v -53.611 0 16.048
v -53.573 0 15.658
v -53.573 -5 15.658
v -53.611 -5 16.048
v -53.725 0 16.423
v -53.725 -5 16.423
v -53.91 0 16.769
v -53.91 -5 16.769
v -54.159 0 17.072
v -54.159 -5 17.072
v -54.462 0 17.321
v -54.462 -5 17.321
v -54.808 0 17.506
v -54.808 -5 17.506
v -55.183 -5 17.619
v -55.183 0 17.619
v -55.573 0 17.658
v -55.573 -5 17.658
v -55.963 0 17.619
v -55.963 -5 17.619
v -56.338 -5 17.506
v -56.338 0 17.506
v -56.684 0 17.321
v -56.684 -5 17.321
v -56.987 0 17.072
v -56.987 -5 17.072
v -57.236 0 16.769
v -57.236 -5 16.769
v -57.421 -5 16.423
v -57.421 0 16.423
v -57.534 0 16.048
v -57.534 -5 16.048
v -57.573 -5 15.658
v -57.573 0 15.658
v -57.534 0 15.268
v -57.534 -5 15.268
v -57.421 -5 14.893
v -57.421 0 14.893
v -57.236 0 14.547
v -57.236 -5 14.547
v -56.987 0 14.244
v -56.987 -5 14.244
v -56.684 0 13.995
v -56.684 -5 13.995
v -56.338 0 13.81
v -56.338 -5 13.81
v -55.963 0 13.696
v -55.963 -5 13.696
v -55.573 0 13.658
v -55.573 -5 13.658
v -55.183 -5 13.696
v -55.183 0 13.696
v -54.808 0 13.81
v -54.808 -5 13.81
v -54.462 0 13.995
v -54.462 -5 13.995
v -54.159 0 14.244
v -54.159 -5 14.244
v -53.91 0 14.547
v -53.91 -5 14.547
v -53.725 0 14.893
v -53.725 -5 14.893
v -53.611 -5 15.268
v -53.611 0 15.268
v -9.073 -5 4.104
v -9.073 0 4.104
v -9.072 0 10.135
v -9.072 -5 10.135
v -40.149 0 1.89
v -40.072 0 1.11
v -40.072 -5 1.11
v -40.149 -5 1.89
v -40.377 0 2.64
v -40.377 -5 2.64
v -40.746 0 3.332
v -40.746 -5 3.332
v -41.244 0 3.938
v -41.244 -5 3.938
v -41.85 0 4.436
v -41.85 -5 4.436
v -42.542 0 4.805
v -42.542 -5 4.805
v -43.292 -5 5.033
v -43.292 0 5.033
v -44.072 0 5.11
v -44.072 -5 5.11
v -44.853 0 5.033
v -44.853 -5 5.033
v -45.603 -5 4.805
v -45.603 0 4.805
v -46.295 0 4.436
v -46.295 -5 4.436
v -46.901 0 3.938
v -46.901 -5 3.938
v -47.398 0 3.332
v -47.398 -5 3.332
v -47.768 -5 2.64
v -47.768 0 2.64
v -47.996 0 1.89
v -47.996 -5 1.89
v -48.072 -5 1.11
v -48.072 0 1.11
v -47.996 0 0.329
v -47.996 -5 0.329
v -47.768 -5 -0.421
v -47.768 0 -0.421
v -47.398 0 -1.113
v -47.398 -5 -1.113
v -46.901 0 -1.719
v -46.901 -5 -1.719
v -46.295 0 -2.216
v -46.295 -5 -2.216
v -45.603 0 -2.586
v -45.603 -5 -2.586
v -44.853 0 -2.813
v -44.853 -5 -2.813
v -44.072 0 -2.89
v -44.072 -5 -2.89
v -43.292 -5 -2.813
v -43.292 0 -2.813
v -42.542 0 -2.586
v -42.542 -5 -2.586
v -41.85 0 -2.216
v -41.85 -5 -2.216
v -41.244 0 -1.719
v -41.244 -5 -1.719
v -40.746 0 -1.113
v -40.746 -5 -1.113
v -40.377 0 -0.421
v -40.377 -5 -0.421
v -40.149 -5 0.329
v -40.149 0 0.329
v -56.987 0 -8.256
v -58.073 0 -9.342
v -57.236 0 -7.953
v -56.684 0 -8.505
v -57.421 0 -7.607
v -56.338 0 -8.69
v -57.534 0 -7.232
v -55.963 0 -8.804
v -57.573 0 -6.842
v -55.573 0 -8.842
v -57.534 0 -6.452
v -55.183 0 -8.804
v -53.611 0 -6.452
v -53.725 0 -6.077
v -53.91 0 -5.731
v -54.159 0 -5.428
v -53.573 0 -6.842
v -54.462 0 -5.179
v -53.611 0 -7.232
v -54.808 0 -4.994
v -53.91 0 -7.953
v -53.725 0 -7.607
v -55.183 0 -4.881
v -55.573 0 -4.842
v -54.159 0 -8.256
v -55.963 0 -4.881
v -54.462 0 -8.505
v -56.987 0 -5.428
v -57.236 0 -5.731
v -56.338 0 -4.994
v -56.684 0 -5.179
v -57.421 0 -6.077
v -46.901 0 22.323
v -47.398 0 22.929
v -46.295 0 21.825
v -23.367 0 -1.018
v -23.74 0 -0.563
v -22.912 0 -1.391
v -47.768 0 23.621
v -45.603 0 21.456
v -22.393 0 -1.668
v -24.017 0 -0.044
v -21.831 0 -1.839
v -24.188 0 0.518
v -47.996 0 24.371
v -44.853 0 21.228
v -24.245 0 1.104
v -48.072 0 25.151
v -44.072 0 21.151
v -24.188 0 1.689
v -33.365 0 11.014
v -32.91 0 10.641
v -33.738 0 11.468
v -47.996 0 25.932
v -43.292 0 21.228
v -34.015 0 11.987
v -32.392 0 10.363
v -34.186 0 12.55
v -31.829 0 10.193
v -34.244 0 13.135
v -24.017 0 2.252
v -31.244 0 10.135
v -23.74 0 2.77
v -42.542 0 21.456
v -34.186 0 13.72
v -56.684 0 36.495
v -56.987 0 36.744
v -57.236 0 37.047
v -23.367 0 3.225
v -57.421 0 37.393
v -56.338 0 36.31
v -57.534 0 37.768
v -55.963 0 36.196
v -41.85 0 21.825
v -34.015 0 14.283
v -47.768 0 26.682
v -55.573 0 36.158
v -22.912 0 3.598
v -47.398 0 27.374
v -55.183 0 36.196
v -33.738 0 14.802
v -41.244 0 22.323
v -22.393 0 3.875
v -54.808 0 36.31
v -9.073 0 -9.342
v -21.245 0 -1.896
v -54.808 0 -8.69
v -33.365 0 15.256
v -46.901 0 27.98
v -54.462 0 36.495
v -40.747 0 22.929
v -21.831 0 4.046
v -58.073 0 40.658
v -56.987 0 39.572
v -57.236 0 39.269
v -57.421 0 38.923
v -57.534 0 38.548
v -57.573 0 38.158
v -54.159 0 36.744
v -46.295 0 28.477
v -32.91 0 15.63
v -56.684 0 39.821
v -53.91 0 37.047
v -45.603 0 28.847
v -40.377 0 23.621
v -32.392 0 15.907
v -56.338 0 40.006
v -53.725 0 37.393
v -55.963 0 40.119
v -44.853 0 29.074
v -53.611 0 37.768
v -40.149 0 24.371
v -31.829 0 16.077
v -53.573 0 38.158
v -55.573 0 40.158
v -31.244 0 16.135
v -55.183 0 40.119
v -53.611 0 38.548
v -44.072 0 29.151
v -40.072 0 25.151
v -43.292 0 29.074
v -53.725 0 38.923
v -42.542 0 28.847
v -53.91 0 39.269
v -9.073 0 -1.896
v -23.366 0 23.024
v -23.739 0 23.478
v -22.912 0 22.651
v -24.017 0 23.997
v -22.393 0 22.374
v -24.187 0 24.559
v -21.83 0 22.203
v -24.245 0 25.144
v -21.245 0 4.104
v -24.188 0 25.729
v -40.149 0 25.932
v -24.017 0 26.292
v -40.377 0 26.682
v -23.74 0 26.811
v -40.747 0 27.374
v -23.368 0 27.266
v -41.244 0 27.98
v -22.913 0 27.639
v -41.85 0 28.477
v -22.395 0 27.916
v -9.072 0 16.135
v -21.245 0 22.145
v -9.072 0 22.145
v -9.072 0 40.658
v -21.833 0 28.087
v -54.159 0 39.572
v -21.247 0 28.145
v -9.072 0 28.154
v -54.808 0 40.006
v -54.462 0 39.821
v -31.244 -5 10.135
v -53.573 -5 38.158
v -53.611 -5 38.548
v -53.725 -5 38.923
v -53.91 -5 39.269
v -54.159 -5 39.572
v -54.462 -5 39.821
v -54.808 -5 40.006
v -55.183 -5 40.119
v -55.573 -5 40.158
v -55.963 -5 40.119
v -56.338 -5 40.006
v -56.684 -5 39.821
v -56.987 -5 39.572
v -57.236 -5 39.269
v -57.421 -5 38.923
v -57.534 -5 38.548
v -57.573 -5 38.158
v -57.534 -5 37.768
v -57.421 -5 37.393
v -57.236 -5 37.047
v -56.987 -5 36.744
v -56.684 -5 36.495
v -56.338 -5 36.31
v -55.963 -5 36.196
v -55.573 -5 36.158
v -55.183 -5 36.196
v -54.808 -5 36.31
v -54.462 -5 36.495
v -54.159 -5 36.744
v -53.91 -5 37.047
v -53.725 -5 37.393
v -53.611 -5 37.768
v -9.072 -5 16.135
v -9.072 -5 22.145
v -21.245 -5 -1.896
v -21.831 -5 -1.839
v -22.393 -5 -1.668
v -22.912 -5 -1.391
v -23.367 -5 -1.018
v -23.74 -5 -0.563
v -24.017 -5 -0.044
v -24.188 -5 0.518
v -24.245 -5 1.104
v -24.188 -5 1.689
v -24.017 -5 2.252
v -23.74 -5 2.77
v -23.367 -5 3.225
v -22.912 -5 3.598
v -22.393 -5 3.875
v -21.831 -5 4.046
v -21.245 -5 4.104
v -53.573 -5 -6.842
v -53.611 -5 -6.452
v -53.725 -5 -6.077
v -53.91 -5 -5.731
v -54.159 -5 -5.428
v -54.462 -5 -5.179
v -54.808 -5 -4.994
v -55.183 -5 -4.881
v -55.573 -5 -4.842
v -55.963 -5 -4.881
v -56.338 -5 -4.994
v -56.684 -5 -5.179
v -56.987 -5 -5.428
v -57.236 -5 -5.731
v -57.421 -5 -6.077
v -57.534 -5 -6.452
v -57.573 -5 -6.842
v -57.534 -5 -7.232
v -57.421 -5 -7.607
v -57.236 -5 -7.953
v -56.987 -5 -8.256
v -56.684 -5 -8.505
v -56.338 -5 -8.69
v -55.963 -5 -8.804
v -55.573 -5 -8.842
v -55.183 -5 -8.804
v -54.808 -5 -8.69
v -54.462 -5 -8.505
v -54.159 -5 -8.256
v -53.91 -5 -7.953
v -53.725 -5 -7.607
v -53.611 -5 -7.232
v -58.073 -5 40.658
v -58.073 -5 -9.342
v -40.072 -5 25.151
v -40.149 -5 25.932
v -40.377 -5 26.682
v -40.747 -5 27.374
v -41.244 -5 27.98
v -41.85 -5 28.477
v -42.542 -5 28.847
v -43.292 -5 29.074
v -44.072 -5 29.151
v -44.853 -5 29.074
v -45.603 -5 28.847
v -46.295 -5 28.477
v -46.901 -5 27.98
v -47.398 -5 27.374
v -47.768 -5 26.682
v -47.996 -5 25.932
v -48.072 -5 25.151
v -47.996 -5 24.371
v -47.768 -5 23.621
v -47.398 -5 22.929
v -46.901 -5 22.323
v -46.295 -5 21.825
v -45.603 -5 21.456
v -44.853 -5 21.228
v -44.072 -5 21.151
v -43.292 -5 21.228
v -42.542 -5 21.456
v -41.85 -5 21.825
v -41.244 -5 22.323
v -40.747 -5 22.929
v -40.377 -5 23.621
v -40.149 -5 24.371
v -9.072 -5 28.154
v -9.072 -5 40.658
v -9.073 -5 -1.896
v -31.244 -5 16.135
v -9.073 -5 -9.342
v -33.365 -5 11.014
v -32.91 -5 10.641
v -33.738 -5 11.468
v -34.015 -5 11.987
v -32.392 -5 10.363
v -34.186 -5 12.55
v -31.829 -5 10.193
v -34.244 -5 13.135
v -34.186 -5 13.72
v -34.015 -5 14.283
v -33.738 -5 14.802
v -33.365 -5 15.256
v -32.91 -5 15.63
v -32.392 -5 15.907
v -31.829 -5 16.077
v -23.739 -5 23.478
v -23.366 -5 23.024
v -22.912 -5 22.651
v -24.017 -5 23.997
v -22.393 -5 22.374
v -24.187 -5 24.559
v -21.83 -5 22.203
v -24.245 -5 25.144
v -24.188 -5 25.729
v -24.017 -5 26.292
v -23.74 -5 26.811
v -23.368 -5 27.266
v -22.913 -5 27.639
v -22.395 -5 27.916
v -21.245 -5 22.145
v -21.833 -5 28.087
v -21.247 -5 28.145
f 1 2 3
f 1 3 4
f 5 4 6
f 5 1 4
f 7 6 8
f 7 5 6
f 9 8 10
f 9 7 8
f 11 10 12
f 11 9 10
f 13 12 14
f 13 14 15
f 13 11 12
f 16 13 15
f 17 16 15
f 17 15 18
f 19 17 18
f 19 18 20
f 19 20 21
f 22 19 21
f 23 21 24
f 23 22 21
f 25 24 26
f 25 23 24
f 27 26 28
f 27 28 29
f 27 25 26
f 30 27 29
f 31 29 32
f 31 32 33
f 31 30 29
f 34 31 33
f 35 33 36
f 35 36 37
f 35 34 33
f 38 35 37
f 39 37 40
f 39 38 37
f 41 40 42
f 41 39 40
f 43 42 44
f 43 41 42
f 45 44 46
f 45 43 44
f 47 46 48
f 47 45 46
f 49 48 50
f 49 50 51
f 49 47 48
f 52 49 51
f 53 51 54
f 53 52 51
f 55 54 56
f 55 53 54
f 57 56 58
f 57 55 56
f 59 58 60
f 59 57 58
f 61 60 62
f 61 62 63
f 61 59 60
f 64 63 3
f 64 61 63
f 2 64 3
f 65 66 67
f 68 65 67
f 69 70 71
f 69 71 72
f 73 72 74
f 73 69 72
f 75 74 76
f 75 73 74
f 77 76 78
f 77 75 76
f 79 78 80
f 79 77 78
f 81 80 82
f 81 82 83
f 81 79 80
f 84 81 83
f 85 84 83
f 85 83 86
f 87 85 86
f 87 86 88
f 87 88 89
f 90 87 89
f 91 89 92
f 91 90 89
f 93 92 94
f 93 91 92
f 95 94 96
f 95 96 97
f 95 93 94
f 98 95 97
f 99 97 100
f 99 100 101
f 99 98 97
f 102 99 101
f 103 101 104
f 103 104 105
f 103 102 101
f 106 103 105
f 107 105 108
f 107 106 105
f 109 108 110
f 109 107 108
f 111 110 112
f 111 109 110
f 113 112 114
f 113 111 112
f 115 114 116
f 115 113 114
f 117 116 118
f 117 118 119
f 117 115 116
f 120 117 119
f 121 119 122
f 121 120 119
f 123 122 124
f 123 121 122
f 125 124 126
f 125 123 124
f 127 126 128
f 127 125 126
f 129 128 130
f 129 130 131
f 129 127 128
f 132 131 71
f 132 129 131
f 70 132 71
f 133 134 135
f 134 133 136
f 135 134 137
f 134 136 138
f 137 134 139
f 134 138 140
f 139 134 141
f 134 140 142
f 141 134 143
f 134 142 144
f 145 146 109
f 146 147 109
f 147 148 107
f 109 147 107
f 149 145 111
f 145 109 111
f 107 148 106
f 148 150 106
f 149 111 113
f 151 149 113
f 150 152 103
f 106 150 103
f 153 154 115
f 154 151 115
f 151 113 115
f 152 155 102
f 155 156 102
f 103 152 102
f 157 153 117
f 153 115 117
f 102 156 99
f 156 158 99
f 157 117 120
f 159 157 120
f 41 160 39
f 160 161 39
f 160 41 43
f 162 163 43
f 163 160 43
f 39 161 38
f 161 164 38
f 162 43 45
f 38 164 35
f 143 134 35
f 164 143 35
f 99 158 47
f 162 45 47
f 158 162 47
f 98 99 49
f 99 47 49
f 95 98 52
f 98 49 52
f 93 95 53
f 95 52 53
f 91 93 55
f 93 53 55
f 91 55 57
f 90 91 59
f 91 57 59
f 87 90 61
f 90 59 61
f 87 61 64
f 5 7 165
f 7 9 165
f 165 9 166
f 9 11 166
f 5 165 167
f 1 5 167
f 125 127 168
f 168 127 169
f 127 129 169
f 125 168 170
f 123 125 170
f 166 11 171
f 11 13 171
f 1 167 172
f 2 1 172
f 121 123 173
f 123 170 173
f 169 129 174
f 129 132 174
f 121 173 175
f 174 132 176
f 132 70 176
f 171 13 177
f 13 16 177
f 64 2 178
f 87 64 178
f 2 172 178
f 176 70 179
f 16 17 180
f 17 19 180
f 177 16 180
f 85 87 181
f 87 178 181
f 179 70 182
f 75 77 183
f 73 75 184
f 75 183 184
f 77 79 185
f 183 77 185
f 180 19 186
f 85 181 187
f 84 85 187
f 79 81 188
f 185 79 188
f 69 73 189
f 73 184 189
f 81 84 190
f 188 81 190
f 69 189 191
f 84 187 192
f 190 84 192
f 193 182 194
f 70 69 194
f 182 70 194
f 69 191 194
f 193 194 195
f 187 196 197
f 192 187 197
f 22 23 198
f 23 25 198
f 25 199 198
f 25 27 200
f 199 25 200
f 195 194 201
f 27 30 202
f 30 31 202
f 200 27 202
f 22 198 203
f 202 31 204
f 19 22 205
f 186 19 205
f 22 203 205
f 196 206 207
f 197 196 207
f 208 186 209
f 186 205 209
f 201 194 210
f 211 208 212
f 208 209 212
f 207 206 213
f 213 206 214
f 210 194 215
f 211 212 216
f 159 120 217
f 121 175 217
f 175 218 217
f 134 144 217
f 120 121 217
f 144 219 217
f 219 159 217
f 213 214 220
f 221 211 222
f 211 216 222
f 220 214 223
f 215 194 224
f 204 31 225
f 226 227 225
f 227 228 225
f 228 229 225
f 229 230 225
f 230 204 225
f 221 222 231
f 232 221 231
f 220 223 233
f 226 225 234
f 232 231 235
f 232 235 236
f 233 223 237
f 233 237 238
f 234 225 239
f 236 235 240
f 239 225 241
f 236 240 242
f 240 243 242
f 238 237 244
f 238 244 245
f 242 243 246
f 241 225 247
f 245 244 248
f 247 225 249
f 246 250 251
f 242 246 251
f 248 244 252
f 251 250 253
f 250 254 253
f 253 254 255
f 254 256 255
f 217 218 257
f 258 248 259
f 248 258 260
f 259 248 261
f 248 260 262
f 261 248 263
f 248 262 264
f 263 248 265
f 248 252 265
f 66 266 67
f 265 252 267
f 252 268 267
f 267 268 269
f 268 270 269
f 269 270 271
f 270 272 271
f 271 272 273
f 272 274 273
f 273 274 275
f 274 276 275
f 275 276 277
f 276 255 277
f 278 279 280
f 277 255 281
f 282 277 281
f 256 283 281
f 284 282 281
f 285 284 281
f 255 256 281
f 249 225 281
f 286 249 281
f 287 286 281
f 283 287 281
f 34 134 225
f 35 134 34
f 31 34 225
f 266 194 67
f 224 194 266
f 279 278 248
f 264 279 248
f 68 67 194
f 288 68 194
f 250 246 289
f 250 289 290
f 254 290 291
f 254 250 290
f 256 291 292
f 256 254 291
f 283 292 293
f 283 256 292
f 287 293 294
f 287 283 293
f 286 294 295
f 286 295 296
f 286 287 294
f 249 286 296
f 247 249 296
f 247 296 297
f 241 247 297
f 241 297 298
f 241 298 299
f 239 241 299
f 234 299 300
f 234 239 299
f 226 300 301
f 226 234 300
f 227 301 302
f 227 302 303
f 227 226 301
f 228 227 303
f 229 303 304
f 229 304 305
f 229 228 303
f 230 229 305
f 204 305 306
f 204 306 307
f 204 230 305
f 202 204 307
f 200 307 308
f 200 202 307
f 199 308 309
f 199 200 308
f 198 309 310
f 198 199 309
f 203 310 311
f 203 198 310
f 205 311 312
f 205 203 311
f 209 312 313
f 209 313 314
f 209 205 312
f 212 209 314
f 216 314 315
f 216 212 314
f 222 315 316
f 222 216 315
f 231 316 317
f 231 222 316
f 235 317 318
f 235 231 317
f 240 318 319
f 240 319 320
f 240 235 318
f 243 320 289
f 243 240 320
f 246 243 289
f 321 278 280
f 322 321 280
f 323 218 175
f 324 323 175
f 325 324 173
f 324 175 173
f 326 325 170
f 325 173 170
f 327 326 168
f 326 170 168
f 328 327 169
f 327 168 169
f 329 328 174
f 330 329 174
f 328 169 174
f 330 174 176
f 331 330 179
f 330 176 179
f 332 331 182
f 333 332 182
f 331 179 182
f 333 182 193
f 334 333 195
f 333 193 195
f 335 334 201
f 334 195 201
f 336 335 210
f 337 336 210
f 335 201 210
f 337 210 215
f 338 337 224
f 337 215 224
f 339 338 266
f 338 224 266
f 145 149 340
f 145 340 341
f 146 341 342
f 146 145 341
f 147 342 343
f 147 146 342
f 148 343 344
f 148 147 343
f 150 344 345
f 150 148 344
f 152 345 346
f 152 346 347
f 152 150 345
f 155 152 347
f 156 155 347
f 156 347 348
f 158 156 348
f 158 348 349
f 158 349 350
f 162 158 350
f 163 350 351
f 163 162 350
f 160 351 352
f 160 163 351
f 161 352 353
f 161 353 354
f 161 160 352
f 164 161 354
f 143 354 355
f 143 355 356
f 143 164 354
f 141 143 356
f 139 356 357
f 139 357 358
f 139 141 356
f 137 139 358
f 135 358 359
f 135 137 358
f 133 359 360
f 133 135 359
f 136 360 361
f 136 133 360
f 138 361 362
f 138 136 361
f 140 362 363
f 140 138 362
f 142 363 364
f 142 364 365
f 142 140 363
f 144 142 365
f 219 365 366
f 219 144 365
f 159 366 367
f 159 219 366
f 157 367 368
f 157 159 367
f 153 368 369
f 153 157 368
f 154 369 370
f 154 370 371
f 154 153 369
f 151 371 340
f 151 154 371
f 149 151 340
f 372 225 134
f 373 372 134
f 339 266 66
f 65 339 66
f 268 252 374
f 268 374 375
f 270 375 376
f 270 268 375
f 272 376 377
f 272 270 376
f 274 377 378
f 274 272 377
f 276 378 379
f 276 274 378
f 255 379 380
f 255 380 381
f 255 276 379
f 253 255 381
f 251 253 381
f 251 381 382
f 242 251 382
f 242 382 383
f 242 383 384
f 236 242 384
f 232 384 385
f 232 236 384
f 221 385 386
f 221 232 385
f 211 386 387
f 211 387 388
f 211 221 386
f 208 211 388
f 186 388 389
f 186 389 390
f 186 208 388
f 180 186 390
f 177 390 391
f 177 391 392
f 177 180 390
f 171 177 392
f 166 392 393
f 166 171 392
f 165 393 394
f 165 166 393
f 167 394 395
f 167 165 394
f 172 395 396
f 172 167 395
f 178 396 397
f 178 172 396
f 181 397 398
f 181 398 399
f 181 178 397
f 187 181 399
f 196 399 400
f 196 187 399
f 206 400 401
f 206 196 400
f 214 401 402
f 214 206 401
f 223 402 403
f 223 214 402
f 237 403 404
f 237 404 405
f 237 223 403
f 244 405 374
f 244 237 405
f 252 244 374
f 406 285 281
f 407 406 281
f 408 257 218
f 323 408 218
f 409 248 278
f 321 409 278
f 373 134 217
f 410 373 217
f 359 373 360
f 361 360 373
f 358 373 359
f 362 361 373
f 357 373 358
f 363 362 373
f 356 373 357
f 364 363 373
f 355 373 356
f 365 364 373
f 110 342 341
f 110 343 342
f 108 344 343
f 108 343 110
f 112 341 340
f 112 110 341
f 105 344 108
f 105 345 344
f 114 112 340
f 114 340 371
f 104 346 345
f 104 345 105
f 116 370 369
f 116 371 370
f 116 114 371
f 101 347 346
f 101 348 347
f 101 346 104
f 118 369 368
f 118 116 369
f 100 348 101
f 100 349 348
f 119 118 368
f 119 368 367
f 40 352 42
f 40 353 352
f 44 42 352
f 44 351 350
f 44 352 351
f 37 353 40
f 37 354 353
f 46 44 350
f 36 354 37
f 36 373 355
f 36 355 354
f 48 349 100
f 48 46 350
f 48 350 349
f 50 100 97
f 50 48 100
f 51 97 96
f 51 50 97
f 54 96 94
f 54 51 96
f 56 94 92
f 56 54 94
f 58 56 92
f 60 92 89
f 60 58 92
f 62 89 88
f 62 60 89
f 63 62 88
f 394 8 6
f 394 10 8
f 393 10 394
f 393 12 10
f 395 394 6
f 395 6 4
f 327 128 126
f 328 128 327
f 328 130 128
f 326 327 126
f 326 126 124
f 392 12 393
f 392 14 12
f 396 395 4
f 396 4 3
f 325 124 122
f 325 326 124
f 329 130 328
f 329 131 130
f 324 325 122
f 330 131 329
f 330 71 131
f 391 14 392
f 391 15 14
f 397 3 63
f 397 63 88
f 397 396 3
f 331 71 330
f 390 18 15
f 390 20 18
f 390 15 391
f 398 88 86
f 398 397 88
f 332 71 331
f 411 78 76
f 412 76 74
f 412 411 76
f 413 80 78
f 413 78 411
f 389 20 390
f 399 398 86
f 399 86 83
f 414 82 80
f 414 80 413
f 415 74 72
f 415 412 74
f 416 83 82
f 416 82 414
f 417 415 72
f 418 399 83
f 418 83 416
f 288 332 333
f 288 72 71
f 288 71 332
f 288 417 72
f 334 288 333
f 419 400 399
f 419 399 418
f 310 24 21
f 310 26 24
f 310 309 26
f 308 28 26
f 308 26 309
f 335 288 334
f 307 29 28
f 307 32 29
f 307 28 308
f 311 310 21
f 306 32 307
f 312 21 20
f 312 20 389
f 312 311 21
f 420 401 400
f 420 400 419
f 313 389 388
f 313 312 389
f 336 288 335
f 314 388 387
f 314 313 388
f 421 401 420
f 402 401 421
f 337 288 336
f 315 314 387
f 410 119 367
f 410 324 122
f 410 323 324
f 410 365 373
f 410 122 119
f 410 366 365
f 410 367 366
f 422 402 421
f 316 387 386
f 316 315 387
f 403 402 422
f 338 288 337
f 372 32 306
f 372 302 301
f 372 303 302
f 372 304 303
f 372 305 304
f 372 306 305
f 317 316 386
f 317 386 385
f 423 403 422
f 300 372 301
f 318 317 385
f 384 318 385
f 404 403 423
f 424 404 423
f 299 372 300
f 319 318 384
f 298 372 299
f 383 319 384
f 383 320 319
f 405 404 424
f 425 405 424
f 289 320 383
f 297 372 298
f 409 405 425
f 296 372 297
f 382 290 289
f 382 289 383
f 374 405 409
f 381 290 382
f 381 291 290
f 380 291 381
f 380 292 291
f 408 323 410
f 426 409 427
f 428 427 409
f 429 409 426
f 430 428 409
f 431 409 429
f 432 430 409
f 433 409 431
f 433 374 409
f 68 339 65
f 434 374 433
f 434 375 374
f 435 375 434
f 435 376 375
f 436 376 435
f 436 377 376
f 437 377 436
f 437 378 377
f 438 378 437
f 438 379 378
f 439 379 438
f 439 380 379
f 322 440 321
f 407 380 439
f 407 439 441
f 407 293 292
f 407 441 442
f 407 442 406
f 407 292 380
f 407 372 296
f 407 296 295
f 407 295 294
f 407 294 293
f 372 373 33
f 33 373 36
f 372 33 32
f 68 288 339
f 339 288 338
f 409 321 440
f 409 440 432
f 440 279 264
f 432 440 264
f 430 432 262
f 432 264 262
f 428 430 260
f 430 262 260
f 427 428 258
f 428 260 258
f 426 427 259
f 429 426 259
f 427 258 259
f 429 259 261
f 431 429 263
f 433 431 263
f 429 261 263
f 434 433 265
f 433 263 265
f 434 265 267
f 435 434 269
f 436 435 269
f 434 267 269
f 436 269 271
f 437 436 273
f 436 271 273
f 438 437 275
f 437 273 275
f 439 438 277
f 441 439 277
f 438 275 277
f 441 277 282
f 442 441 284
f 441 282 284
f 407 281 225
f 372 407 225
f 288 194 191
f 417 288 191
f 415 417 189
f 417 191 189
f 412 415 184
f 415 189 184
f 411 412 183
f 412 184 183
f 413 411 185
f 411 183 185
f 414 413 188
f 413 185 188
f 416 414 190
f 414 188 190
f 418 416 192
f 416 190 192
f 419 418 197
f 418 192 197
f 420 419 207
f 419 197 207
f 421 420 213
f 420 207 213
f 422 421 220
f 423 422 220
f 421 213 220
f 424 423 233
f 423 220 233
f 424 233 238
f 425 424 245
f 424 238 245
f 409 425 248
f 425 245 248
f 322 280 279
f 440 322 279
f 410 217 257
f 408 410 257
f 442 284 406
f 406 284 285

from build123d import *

# Parameters (mm, degrees)
F0_R     = 2
F0_R_2   = 4
F1_DEPTH = 5


with BuildPart() as f1:
    # F0 (on Front) → F1 (new body)
    with BuildSketch(Plane.XZ):
        with BuildLine():
            Line((-9.071991, 28.153977), (-9.071683, 40.657913))
            Line((-9.071683, 40.657913), (-58.072915, 40.657913))
            Line((-58.072915, 40.657913), (-58.072915, -9.342087))
            Line((-58.072915, -9.342087), (-9.072915, -9.342087))
            Line((-9.072915, -9.342087), (-9.072732, -1.896336))
            Line((-9.072732, -1.896336), (-21.245276, -1.896336))
            ThreePointArc((-21.245276, -1.896336), (-24.245276, 1.103664), (-21.245276, 4.103664))
            Line((-21.245276, 4.103664), (-9.082483, 4.103664))
            Line((-9.082483, 4.103664), (-9.072584, 4.103664))
            Line((-9.072584, 4.103664), (-9.072436, 10.135129))
            Line((-9.072436, 10.135129), (-31.243636, 10.135129))
            ThreePointArc((-31.243636, 10.135129), (-34.243636, 13.135129), (-31.243636, 16.135129))
            Line((-31.243636, 16.135129), (-9.072288, 16.135129))
            Line((-9.072288, 16.135129), (-9.07214, 22.145314))
            Line((-9.07214, 22.145314), (-21.245276, 22.145314))
            ThreePointArc((-21.245276, 22.145314), (-24.245275, 25.144246), (-21.24741, 28.145313))
            Line((-21.24741, 28.145313), (-9.071991, 28.153977))
        make_face()
        with Locations((-55.572915, -6.842087)):
            Circle(F0_R, mode=Mode.SUBTRACT)
        with Locations((-44.072376, 1.109681)):
            Circle(F0_R_2, mode=Mode.SUBTRACT)
        with Locations((-55.572915, 15.657913)):
            Circle(F0_R, mode=Mode.SUBTRACT)
        with Locations((-44.072434, 25.151316)):
            Circle(F0_R_2, mode=Mode.SUBTRACT)
        with Locations((-55.572915, 38.157913)):
            Circle(F0_R, mode=Mode.SUBTRACT)
    extrude(amount=F1_DEPTH)


solid = f1.part
